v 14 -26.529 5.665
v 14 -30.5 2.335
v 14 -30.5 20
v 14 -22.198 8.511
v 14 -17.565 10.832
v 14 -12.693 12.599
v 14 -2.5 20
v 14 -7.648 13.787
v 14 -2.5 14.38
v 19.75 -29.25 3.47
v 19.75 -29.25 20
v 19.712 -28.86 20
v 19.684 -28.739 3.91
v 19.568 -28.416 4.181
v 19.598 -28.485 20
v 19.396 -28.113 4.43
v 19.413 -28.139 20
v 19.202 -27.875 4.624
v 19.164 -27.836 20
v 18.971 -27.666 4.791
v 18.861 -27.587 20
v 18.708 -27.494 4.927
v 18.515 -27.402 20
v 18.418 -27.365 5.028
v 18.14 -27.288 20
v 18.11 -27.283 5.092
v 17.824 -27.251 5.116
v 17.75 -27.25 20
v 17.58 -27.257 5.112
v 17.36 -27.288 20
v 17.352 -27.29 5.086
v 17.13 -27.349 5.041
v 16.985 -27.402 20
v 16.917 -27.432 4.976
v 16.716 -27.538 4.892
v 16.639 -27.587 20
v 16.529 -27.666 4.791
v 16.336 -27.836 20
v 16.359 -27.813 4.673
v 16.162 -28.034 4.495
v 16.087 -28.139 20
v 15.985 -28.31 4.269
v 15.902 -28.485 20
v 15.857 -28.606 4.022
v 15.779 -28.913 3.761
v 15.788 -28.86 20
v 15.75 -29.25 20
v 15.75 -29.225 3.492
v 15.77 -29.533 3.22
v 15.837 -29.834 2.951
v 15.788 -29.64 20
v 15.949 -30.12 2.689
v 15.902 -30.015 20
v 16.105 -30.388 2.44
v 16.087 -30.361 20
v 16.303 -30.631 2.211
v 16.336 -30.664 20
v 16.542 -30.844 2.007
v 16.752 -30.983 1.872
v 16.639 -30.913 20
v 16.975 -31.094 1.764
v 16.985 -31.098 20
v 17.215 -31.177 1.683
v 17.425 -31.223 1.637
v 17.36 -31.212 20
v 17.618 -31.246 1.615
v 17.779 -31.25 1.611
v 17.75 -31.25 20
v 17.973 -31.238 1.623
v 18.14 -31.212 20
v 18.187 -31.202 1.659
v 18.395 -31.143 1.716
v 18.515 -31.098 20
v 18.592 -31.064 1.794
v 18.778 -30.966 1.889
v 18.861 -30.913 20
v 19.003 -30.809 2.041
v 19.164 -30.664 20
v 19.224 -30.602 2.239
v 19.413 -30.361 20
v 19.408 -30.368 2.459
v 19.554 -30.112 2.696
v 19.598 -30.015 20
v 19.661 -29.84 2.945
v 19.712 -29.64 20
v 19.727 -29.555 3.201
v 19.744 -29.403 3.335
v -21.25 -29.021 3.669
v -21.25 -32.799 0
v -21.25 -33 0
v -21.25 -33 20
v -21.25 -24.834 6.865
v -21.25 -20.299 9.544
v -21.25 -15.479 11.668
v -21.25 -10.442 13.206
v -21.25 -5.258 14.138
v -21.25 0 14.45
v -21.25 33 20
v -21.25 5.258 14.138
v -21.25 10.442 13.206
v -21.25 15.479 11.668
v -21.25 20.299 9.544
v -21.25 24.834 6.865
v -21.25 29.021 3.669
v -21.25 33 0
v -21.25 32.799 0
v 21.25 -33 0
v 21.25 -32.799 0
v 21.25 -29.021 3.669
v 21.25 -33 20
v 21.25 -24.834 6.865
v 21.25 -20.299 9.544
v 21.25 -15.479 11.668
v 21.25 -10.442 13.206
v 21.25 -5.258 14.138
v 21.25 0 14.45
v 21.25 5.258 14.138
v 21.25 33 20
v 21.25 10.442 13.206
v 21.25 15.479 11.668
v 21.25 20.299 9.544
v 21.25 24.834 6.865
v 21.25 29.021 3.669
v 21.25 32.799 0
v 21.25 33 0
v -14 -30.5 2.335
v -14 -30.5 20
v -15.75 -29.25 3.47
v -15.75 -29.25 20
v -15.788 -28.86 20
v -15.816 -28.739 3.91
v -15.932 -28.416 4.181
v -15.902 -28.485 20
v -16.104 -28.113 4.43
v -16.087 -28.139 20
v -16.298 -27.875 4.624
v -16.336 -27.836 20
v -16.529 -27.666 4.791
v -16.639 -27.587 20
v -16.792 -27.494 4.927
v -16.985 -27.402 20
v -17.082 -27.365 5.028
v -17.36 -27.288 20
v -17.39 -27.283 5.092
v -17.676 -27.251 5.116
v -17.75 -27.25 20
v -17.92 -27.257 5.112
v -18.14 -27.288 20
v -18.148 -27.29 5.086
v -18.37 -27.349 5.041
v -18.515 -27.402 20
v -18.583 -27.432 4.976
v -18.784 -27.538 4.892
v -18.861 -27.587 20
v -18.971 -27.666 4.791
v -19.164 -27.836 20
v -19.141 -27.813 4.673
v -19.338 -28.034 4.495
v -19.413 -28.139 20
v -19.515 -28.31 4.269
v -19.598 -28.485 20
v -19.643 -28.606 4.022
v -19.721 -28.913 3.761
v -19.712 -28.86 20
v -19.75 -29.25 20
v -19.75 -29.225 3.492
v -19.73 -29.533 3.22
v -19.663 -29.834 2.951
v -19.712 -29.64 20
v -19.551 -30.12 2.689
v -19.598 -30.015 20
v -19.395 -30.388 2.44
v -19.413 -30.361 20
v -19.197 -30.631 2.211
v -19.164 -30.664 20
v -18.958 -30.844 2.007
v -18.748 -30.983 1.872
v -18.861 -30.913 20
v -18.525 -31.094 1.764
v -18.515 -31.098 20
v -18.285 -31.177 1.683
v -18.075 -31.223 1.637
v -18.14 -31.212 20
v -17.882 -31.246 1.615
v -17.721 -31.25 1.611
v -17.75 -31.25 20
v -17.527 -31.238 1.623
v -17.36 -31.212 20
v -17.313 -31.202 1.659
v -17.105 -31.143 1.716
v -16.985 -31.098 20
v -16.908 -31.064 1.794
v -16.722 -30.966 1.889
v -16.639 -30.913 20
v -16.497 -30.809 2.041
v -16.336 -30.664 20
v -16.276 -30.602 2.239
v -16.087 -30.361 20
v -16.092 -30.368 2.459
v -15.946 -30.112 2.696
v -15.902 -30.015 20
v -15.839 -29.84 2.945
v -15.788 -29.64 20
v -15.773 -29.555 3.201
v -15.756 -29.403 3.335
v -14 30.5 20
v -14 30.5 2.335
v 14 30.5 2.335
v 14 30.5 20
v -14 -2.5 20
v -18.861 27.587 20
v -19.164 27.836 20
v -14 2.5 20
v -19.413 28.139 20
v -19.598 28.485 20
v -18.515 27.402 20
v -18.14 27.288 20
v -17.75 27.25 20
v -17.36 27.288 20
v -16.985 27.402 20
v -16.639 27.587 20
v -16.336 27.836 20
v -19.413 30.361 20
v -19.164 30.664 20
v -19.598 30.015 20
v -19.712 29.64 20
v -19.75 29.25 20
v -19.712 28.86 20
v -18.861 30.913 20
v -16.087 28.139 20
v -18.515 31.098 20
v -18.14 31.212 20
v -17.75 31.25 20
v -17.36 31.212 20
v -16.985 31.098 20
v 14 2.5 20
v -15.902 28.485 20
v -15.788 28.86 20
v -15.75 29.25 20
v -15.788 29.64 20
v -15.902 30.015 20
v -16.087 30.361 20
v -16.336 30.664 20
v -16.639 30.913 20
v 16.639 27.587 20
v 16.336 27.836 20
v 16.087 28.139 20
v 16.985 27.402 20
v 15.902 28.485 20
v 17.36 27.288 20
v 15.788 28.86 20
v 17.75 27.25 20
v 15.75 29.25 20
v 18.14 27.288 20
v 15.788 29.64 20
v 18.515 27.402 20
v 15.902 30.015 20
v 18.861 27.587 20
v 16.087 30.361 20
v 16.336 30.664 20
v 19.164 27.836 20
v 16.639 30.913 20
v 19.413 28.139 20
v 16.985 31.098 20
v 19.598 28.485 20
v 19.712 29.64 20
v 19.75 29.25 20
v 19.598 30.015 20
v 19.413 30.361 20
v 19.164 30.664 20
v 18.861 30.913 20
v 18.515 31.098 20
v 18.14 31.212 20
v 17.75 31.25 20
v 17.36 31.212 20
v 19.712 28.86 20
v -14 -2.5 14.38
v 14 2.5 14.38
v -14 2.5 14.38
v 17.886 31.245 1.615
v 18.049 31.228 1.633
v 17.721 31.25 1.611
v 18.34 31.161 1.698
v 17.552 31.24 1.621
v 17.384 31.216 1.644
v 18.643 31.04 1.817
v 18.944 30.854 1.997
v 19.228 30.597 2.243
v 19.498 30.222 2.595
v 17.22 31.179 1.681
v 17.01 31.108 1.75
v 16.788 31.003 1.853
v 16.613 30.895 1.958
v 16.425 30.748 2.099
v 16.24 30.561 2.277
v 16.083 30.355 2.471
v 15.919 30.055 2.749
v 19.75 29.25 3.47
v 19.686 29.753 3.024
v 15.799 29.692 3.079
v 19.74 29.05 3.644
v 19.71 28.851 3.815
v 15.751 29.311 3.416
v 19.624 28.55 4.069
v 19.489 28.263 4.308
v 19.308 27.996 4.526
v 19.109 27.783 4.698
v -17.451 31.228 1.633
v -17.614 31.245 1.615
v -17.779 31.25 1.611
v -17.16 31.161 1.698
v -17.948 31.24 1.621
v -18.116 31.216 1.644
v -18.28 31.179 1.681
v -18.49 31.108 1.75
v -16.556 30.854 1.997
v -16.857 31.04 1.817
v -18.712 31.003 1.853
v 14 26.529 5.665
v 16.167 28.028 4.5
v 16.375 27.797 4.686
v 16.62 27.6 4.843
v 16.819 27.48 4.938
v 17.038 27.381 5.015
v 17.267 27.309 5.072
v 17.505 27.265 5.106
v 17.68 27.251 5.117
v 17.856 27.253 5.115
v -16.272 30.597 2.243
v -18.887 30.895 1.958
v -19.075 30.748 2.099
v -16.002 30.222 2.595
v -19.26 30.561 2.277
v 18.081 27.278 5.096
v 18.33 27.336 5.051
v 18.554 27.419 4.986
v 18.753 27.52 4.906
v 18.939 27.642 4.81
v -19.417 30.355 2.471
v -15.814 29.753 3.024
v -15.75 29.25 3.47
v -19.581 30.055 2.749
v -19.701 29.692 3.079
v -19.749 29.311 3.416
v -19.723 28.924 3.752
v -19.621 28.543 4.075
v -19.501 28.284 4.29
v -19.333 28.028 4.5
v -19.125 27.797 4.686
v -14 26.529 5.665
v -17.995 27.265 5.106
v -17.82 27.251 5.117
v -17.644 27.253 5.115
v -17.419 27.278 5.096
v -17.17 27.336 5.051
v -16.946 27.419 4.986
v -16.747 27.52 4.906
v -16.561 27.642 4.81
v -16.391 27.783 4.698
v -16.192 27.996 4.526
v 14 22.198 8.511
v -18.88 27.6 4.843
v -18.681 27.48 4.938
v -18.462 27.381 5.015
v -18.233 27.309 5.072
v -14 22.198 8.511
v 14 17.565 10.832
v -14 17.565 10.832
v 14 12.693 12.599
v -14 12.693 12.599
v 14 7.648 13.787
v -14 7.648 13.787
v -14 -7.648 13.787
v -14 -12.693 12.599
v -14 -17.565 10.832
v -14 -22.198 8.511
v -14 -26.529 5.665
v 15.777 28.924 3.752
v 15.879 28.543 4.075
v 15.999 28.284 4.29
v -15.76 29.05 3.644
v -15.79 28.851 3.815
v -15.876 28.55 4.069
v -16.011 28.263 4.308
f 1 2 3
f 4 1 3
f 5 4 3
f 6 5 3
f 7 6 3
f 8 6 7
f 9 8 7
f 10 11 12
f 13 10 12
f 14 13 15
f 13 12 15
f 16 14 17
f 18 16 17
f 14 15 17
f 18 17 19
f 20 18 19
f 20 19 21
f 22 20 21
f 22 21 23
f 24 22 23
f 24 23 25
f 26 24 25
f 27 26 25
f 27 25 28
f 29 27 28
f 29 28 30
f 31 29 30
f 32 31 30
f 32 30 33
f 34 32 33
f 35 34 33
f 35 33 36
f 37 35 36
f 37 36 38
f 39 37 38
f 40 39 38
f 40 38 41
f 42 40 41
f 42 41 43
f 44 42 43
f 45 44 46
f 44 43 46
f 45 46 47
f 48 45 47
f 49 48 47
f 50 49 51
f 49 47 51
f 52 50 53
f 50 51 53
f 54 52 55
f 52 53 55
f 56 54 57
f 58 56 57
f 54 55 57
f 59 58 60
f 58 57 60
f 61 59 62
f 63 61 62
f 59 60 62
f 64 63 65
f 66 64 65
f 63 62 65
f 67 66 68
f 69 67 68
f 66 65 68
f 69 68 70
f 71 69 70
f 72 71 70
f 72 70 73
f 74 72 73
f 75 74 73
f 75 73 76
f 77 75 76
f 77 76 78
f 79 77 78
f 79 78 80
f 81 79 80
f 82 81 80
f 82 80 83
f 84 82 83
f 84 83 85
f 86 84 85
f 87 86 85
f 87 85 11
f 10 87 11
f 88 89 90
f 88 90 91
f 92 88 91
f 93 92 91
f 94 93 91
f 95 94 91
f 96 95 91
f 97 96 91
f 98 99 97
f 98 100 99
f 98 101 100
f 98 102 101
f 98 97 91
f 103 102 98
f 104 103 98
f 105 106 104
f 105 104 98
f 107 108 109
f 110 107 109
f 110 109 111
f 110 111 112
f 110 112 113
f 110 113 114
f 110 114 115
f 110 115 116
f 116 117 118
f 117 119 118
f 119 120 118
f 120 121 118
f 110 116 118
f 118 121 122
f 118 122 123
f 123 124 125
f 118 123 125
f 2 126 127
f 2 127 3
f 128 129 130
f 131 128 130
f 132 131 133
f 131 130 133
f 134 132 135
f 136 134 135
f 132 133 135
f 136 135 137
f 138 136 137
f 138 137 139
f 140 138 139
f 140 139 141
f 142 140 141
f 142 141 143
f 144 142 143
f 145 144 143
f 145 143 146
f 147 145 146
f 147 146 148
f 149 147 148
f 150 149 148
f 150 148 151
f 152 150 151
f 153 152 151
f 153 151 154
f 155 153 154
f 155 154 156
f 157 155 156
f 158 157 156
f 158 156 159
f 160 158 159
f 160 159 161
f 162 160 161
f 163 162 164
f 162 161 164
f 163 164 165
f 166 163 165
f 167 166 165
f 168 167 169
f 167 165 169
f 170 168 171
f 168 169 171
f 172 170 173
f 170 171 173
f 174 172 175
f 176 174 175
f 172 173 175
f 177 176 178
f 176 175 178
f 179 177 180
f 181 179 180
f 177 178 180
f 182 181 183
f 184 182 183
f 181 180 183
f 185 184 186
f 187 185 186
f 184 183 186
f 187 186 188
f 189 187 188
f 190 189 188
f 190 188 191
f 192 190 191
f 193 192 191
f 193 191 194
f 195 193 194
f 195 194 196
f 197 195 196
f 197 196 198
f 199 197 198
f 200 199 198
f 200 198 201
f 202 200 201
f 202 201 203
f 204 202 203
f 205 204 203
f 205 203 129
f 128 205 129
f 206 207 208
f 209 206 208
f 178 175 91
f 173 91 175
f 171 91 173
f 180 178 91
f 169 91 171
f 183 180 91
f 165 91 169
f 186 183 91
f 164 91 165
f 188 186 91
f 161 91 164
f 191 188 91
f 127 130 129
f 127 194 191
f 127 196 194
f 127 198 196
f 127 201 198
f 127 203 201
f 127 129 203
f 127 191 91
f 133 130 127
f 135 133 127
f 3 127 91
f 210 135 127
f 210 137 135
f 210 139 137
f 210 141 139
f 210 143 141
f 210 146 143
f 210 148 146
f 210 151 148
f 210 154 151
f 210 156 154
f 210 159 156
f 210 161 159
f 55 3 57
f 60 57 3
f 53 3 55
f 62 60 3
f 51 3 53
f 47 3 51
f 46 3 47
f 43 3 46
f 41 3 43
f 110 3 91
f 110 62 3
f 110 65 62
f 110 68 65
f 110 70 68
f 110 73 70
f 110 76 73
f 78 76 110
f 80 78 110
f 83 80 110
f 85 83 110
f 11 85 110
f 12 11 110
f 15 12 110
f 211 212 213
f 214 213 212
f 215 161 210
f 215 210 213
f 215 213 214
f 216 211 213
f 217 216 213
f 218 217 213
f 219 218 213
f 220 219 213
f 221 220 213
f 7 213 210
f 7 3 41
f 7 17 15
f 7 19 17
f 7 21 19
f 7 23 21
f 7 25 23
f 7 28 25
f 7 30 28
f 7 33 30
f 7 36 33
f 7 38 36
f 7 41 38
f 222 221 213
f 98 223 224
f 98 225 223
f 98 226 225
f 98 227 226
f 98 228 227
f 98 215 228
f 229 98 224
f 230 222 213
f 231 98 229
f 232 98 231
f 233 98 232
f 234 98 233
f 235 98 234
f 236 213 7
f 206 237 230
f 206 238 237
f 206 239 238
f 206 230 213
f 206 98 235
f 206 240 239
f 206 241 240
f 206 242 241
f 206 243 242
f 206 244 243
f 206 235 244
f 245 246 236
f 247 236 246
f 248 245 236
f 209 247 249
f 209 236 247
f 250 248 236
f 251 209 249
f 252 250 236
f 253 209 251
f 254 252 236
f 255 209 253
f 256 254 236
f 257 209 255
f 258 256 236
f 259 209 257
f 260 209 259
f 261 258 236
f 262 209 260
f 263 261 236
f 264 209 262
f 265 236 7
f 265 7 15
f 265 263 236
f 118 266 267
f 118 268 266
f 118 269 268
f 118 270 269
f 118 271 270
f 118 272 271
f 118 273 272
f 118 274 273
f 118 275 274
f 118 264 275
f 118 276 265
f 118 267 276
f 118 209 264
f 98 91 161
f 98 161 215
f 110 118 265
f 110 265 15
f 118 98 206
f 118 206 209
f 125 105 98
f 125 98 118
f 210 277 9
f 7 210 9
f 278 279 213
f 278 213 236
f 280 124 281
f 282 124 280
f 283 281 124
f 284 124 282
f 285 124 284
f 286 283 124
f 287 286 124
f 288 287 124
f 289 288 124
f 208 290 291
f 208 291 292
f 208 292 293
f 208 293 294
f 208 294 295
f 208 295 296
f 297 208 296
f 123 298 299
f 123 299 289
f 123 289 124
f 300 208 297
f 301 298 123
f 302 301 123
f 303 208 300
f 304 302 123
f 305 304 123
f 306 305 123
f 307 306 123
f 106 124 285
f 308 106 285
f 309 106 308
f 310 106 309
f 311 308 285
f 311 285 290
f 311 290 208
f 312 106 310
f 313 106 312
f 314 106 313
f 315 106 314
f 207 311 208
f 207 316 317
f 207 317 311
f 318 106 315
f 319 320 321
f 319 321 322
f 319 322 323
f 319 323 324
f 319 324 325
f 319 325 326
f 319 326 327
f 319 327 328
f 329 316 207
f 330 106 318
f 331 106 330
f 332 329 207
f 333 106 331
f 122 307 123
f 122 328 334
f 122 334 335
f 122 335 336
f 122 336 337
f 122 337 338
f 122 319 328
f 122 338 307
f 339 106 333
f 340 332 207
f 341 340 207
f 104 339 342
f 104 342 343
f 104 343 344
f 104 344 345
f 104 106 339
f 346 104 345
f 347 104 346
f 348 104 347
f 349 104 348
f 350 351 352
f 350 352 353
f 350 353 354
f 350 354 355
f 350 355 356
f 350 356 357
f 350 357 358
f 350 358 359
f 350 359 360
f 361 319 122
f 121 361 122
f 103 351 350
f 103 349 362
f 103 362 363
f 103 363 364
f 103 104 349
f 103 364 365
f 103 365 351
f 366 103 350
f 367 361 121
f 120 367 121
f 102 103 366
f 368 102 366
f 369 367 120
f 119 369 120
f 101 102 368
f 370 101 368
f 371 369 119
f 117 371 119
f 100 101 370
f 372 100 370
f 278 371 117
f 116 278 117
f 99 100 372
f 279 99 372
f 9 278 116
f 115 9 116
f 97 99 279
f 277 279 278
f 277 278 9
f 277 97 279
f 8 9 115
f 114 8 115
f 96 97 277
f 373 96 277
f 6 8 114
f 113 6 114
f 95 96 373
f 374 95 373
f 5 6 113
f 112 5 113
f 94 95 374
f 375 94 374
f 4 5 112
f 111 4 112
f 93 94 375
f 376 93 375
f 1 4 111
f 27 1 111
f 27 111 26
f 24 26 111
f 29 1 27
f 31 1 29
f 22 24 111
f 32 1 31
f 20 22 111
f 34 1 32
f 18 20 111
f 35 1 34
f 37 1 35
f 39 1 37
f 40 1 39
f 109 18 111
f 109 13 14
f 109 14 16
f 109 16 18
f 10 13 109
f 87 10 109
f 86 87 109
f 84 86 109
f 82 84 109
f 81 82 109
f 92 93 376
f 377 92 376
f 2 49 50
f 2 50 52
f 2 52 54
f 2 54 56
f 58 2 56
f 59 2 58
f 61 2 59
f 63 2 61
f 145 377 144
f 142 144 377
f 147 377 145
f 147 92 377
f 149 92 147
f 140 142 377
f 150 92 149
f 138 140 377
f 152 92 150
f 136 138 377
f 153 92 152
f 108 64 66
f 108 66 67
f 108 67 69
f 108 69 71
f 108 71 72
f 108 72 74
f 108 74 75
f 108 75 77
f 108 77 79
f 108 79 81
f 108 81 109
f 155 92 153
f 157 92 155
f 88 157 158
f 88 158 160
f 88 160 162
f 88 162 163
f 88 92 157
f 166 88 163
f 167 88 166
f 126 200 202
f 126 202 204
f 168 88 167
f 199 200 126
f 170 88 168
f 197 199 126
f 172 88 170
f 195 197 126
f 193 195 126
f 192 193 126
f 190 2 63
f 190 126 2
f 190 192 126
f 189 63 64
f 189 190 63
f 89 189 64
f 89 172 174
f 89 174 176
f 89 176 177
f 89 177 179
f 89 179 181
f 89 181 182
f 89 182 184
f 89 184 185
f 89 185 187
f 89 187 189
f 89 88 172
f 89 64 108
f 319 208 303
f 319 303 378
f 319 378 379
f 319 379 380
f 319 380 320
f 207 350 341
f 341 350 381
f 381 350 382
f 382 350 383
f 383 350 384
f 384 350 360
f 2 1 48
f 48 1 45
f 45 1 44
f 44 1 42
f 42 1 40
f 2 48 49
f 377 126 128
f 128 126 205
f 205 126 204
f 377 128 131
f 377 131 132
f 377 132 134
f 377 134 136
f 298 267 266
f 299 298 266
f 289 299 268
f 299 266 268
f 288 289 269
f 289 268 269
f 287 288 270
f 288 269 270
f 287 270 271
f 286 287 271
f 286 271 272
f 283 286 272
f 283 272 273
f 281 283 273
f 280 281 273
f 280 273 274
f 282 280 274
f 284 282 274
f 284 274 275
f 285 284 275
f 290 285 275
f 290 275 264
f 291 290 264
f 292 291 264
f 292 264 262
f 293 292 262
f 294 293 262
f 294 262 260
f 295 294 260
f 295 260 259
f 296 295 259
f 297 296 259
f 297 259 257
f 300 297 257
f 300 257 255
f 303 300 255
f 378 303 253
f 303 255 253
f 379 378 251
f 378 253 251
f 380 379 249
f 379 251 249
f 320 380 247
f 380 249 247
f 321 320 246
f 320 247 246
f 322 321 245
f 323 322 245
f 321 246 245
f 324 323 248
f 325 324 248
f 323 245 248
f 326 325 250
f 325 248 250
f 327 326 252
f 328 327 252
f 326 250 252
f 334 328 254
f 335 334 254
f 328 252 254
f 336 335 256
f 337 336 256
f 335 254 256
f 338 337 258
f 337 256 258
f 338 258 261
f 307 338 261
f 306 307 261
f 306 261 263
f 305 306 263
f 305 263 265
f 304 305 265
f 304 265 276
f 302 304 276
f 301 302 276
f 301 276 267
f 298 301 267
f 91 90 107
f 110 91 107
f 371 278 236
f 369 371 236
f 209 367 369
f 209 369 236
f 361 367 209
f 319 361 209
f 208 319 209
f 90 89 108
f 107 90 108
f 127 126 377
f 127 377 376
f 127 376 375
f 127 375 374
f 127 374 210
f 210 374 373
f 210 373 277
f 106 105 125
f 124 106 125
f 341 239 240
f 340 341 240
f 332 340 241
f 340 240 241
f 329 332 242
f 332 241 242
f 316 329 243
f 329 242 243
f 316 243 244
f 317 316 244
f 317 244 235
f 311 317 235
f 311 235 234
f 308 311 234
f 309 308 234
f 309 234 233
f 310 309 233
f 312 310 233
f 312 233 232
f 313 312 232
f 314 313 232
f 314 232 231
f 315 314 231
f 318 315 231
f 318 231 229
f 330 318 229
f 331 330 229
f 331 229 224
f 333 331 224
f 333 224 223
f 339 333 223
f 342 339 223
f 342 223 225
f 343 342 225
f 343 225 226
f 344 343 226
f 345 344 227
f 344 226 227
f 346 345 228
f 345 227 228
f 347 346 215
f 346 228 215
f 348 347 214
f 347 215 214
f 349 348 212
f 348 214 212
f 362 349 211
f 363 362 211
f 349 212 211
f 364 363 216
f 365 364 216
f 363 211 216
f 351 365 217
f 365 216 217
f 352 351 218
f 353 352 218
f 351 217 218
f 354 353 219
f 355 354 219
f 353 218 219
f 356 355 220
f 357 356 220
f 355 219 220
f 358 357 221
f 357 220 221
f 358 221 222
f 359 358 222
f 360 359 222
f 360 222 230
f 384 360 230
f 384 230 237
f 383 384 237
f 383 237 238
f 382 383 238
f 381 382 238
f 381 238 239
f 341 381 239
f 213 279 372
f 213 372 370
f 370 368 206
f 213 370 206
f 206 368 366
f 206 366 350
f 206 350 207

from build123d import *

# Parameters (mm, degrees)
SKETCH1_W               = 42.5
SKETCH1_H               = 66
SKETCH1_W_2             = 28
SKETCH1_H_2             = 28
BOSS_EXTRUDE1_DEPTH     = 20
CUT_EXTRUDE1_DEPTH      = 26
CUT_EXTRUDE1_DEPTH_BACK = 27
SKETCH3_R               = 44.45
SKETCH4_R               = 2
CUT_EXTRUDE2_DEPTH      = 27


with BuildPart() as part:
    # Sketch1 → Boss-Extrude1 (new body)
    with BuildSketch(Plane.XY):
        Rectangle(SKETCH1_W, SKETCH1_H)
        with Locations((0, 16.5)):
            Rectangle(SKETCH1_W_2, SKETCH1_H_2, mode=Mode.SUBTRACT)
        with Locations((0, -16.5)):
            Rectangle(SKETCH1_W_2, SKETCH1_H_2, mode=Mode.SUBTRACT)
    extrude(amount=BOSS_EXTRUDE1_DEPTH)

    # Sketch3 → Cut-Extrude1 (cut, two sides: drawn at the far end of the back side and taken through both)
    with BuildSketch(Plane(origin=(0, 0, 0), x_dir=(0, 0, -1), z_dir=(1, 0, 0)).offset(-CUT_EXTRUDE1_DEPTH_BACK)):
        with Locations((30, 0)):
            Circle(SKETCH3_R)
    extrude(amount=CUT_EXTRUDE1_DEPTH + CUT_EXTRUDE1_DEPTH_BACK, mode=Mode.SUBTRACT)

    # Sketch4 → Cut-Extrude2 (cut)
    with BuildSketch(Plane.XY.offset(20)):
        with Locations((-17.75, 29.25)):
            Circle(SKETCH4_R)
        with Locations((17.75, 29.25)):
            Circle(SKETCH4_R)
        with Locations((-17.75, -29.25)):
            Circle(SKETCH4_R)
        with Locations((17.75, -29.25)):
            Circle(SKETCH4_R)
    extrude(amount=-CUT_EXTRUDE2_DEPTH, mode=Mode.SUBTRACT)


solid = part.part
